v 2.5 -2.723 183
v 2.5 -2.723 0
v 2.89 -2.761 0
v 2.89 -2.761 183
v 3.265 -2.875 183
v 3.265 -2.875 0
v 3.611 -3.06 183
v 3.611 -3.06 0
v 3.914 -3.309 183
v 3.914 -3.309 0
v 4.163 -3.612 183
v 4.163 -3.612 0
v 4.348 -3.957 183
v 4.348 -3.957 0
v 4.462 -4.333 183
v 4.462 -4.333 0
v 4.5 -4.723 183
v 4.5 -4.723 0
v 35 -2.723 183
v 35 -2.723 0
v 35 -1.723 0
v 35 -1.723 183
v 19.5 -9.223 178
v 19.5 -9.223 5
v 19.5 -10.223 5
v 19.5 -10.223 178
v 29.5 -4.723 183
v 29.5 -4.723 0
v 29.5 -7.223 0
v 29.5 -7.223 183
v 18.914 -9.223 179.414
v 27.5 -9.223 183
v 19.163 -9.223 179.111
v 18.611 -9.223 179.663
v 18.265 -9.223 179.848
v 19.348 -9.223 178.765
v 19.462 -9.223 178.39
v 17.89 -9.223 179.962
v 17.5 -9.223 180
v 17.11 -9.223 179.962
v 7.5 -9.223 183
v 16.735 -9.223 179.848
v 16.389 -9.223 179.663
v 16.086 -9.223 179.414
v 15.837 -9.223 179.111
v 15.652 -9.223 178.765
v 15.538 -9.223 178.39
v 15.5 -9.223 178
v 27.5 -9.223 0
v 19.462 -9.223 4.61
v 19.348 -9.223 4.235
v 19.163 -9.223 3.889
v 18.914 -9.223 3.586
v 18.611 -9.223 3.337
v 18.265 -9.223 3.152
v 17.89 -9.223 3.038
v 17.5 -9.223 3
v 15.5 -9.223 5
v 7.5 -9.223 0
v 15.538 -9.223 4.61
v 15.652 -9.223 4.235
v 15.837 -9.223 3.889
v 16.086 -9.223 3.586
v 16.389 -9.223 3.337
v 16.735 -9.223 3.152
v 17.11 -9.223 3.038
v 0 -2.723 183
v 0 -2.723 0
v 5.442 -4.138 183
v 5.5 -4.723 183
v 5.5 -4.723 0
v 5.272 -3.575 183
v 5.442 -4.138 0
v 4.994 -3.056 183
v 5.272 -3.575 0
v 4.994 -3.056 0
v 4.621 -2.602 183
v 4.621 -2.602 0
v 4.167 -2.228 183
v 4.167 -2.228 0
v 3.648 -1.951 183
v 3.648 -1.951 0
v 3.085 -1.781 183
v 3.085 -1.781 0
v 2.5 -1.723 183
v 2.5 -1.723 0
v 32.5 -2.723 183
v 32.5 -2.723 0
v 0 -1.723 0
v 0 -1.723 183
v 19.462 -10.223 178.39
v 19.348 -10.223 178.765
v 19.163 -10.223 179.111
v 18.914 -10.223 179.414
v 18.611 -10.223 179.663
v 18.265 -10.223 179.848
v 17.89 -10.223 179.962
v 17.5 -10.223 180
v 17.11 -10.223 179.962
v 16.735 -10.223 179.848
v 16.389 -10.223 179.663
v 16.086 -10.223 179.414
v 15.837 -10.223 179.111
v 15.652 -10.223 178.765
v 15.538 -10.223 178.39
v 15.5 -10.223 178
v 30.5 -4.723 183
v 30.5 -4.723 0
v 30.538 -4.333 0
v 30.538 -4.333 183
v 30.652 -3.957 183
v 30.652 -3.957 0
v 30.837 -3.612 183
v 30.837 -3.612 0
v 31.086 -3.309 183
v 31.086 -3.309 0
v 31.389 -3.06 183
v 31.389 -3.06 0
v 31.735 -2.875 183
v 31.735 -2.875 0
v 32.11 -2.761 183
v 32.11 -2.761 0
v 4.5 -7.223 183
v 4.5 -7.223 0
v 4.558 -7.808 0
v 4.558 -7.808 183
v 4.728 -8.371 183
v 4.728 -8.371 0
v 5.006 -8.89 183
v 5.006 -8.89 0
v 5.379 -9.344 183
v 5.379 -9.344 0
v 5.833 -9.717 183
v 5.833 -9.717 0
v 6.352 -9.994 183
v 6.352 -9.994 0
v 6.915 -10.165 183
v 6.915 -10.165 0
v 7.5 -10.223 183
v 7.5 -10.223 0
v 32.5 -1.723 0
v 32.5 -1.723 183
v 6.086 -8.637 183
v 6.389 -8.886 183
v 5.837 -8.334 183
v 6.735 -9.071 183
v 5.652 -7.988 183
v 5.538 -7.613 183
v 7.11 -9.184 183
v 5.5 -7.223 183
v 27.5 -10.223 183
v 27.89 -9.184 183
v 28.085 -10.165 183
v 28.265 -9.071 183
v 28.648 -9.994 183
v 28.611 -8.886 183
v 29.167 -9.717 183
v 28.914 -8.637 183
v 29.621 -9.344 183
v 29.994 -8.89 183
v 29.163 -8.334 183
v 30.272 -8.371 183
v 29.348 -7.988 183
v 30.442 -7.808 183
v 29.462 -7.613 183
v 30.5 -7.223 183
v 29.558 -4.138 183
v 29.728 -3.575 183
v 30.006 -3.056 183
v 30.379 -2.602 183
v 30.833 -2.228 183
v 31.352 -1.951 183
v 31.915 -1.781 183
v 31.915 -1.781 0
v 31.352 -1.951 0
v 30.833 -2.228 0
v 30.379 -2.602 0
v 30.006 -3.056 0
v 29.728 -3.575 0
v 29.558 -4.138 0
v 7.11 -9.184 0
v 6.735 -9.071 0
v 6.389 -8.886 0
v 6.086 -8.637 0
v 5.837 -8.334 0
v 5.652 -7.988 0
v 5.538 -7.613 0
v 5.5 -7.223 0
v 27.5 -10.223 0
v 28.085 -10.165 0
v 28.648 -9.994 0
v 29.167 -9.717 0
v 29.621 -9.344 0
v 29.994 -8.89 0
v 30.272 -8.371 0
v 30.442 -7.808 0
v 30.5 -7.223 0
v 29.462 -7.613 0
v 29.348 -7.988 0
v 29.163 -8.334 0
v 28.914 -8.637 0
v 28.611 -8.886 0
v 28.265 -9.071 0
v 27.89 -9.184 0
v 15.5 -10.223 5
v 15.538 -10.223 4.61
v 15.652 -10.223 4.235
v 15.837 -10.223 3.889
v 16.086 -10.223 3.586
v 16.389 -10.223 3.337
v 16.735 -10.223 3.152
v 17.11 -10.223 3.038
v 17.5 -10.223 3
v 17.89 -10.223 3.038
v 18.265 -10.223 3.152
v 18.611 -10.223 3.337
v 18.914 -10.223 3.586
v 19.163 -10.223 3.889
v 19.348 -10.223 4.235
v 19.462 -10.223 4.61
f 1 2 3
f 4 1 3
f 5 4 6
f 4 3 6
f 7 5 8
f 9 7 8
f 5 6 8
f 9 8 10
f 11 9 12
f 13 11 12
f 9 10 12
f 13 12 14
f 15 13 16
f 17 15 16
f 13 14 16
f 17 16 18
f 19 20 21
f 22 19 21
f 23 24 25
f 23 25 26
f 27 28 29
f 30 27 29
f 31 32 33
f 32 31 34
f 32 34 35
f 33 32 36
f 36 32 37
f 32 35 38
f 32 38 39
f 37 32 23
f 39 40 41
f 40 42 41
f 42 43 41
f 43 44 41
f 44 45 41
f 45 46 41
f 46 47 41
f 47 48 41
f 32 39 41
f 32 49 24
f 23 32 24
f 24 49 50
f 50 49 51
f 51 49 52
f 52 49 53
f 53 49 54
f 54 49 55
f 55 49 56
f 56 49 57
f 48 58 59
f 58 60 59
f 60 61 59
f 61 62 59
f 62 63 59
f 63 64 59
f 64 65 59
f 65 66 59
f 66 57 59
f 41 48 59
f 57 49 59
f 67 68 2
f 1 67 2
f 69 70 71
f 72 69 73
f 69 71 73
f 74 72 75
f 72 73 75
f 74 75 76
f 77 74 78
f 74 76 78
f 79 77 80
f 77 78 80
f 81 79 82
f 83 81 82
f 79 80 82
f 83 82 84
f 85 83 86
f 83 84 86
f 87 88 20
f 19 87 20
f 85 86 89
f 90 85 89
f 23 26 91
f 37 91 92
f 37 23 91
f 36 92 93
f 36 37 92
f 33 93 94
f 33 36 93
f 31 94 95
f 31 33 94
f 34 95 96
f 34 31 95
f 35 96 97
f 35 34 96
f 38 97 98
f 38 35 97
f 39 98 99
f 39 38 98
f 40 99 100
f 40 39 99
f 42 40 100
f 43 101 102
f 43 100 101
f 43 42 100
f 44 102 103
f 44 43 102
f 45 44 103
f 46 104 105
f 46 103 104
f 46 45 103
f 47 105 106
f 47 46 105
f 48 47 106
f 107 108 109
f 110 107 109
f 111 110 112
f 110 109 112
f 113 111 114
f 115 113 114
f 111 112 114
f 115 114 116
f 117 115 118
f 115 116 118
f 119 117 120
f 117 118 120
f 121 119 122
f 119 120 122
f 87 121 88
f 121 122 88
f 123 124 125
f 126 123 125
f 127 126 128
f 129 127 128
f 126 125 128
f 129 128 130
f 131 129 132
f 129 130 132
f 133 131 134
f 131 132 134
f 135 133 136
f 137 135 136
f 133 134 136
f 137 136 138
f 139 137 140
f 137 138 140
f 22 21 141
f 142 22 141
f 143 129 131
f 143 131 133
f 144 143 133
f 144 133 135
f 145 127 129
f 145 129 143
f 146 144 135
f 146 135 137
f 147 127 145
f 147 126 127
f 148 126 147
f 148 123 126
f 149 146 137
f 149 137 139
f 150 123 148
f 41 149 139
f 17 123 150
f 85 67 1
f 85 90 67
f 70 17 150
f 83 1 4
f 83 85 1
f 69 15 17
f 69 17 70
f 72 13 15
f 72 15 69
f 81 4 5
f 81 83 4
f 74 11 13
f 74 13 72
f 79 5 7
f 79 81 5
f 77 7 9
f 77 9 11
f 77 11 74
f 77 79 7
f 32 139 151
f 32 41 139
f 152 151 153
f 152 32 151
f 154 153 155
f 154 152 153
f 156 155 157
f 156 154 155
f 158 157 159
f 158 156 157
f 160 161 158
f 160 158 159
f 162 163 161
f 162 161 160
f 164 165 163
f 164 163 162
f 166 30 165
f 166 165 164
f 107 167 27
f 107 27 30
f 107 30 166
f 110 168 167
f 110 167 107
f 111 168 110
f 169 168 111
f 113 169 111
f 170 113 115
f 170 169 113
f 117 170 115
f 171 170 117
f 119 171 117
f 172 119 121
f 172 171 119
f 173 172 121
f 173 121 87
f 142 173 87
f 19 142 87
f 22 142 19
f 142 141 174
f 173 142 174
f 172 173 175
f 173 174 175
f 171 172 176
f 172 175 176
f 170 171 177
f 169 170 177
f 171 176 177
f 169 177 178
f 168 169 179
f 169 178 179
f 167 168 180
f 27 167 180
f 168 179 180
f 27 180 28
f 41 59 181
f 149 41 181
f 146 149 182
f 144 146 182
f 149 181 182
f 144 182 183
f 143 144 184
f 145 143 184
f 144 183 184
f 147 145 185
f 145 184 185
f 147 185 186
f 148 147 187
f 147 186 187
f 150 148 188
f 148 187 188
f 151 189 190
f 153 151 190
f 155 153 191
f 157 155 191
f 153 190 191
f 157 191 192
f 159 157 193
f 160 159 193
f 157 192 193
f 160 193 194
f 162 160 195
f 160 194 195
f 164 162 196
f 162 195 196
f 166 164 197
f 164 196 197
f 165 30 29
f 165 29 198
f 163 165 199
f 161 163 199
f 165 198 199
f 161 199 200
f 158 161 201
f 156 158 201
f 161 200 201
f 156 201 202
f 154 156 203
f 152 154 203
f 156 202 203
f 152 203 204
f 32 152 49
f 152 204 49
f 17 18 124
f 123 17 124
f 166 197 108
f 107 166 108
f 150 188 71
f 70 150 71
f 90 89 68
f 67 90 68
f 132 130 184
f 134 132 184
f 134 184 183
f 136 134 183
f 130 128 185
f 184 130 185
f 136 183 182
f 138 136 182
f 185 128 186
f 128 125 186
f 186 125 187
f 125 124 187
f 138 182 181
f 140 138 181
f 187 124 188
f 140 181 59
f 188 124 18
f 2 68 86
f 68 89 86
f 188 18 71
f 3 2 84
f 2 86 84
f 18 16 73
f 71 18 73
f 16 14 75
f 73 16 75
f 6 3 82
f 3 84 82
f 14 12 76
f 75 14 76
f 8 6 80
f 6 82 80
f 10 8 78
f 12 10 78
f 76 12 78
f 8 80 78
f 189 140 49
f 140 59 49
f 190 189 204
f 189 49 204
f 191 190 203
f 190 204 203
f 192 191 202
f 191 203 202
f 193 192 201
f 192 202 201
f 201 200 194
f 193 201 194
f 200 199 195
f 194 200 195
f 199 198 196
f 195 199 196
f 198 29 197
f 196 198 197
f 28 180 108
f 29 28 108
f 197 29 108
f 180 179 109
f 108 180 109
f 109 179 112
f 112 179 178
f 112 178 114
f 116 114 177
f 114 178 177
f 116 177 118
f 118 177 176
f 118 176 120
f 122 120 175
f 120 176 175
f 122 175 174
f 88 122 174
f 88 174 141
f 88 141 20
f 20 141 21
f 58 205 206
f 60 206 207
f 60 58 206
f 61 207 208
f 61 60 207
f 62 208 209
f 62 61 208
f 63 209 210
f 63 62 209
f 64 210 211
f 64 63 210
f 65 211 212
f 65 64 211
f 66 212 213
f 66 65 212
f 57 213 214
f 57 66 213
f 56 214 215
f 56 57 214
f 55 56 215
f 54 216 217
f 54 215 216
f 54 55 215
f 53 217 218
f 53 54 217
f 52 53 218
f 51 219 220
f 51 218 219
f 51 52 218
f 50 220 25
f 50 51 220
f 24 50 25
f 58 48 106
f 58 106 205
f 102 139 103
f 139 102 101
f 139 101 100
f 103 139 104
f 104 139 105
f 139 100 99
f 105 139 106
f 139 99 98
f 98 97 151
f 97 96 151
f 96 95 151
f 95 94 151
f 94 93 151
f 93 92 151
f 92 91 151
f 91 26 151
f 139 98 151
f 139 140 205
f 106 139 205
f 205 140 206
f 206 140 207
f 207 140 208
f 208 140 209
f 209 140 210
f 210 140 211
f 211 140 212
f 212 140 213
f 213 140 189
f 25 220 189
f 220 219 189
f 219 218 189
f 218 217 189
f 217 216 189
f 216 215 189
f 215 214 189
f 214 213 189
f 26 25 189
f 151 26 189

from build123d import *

# Parameters (mm, degrees)
BOSS_EXTRUDE1_DEPTH = 183
CUT_EXTRUDE1_REACH  = 188.468


with BuildPart() as part:
    # Sketch1 → Boss-Extrude1 (new body)
    with BuildSketch(Plane.XY):
        with BuildLine():
            Line((0, -2.722861027), (2.5, -2.722861027))
            ThreePointArc((2.5, -2.722861027), (3.914213562, -3.308647465), (4.5, -4.722861027))
            Line((4.5, -4.722861027), (4.5, -7.222861027))
            ThreePointArc((4.5, -7.222861027), (5.378679656, -9.344181371), (7.5, -10.222861027))
            Line((7.5, -10.222861027), (17.5, -10.222861027))
            Line((17.5, -10.222861027), (27.5, -10.222861027))
            ThreePointArc((27.5, -10.222861027), (29.621320344, -9.344181371), (30.5, -7.222861027))
            Line((30.5, -7.222861027), (30.5, -4.722861027))
            ThreePointArc((30.5, -4.722861027), (31.085786438, -3.308647465), (32.5, -2.722861027))
            Line((32.5, -2.722861027), (35, -2.722861027))
            Line((35, -2.722861027), (35, -1.722861027))
            Line((35, -1.722861027), (32.5, -1.722861027))
            ThreePointArc((32.5, -1.722861027), (30.378679656, -2.601540684), (29.5, -4.722861027))
            Line((29.5, -4.722861027), (29.5, -7.222861027))
            ThreePointArc((29.5, -7.222861027), (28.914213562, -8.63707459), (27.5, -9.222861027))
            Line((27.5, -9.222861027), (17.5, -9.222861027))
            Line((17.5, -9.222861027), (7.5, -9.222861027))
            ThreePointArc((7.5, -9.222861027), (6.085786438, -8.63707459), (5.5, -7.222861027))
            Line((5.5, -7.222861027), (5.5, -4.722861027))
            ThreePointArc((5.5, -4.722861027), (4.621320344, -2.601540684), (2.5, -1.722861027))
            Line((2.5, -1.722861027), (0, -1.722861027))
            Line((0, -1.722861027), (0, -2.722861027))
        make_face()
    extrude(amount=BOSS_EXTRUDE1_DEPTH)

    # Sketch2 → Cut-Extrude1 (cut, up to next)
    with BuildSketch(Plane(origin=(0, -9.222861027, 0), x_dir=(1, 0, 0), z_dir=(0, 1, 0)), mode=Mode.PRIVATE) as cut_extrude1_sk1:
        with BuildLine():
            Line((15.5, -178), (15.5, -5))
            ThreePointArc((15.5, -5), (17.5, -3), (19.5, -5))
            Line((19.5, -5), (19.5, -178))
            ThreePointArc((19.5, -178), (17.5, -180), (15.5, -178))
        make_face()
    cut_extrude1_tool1 = extrude(cut_extrude1_sk1.sketch, amount=-CUT_EXTRUDE1_REACH, mode=Mode.PRIVATE) & part.part
    add(cut_extrude1_tool1.solids().sort_by_distance((17.5, -9.222861, 91.5))[0], mode=Mode.SUBTRACT)


solid = part.part
